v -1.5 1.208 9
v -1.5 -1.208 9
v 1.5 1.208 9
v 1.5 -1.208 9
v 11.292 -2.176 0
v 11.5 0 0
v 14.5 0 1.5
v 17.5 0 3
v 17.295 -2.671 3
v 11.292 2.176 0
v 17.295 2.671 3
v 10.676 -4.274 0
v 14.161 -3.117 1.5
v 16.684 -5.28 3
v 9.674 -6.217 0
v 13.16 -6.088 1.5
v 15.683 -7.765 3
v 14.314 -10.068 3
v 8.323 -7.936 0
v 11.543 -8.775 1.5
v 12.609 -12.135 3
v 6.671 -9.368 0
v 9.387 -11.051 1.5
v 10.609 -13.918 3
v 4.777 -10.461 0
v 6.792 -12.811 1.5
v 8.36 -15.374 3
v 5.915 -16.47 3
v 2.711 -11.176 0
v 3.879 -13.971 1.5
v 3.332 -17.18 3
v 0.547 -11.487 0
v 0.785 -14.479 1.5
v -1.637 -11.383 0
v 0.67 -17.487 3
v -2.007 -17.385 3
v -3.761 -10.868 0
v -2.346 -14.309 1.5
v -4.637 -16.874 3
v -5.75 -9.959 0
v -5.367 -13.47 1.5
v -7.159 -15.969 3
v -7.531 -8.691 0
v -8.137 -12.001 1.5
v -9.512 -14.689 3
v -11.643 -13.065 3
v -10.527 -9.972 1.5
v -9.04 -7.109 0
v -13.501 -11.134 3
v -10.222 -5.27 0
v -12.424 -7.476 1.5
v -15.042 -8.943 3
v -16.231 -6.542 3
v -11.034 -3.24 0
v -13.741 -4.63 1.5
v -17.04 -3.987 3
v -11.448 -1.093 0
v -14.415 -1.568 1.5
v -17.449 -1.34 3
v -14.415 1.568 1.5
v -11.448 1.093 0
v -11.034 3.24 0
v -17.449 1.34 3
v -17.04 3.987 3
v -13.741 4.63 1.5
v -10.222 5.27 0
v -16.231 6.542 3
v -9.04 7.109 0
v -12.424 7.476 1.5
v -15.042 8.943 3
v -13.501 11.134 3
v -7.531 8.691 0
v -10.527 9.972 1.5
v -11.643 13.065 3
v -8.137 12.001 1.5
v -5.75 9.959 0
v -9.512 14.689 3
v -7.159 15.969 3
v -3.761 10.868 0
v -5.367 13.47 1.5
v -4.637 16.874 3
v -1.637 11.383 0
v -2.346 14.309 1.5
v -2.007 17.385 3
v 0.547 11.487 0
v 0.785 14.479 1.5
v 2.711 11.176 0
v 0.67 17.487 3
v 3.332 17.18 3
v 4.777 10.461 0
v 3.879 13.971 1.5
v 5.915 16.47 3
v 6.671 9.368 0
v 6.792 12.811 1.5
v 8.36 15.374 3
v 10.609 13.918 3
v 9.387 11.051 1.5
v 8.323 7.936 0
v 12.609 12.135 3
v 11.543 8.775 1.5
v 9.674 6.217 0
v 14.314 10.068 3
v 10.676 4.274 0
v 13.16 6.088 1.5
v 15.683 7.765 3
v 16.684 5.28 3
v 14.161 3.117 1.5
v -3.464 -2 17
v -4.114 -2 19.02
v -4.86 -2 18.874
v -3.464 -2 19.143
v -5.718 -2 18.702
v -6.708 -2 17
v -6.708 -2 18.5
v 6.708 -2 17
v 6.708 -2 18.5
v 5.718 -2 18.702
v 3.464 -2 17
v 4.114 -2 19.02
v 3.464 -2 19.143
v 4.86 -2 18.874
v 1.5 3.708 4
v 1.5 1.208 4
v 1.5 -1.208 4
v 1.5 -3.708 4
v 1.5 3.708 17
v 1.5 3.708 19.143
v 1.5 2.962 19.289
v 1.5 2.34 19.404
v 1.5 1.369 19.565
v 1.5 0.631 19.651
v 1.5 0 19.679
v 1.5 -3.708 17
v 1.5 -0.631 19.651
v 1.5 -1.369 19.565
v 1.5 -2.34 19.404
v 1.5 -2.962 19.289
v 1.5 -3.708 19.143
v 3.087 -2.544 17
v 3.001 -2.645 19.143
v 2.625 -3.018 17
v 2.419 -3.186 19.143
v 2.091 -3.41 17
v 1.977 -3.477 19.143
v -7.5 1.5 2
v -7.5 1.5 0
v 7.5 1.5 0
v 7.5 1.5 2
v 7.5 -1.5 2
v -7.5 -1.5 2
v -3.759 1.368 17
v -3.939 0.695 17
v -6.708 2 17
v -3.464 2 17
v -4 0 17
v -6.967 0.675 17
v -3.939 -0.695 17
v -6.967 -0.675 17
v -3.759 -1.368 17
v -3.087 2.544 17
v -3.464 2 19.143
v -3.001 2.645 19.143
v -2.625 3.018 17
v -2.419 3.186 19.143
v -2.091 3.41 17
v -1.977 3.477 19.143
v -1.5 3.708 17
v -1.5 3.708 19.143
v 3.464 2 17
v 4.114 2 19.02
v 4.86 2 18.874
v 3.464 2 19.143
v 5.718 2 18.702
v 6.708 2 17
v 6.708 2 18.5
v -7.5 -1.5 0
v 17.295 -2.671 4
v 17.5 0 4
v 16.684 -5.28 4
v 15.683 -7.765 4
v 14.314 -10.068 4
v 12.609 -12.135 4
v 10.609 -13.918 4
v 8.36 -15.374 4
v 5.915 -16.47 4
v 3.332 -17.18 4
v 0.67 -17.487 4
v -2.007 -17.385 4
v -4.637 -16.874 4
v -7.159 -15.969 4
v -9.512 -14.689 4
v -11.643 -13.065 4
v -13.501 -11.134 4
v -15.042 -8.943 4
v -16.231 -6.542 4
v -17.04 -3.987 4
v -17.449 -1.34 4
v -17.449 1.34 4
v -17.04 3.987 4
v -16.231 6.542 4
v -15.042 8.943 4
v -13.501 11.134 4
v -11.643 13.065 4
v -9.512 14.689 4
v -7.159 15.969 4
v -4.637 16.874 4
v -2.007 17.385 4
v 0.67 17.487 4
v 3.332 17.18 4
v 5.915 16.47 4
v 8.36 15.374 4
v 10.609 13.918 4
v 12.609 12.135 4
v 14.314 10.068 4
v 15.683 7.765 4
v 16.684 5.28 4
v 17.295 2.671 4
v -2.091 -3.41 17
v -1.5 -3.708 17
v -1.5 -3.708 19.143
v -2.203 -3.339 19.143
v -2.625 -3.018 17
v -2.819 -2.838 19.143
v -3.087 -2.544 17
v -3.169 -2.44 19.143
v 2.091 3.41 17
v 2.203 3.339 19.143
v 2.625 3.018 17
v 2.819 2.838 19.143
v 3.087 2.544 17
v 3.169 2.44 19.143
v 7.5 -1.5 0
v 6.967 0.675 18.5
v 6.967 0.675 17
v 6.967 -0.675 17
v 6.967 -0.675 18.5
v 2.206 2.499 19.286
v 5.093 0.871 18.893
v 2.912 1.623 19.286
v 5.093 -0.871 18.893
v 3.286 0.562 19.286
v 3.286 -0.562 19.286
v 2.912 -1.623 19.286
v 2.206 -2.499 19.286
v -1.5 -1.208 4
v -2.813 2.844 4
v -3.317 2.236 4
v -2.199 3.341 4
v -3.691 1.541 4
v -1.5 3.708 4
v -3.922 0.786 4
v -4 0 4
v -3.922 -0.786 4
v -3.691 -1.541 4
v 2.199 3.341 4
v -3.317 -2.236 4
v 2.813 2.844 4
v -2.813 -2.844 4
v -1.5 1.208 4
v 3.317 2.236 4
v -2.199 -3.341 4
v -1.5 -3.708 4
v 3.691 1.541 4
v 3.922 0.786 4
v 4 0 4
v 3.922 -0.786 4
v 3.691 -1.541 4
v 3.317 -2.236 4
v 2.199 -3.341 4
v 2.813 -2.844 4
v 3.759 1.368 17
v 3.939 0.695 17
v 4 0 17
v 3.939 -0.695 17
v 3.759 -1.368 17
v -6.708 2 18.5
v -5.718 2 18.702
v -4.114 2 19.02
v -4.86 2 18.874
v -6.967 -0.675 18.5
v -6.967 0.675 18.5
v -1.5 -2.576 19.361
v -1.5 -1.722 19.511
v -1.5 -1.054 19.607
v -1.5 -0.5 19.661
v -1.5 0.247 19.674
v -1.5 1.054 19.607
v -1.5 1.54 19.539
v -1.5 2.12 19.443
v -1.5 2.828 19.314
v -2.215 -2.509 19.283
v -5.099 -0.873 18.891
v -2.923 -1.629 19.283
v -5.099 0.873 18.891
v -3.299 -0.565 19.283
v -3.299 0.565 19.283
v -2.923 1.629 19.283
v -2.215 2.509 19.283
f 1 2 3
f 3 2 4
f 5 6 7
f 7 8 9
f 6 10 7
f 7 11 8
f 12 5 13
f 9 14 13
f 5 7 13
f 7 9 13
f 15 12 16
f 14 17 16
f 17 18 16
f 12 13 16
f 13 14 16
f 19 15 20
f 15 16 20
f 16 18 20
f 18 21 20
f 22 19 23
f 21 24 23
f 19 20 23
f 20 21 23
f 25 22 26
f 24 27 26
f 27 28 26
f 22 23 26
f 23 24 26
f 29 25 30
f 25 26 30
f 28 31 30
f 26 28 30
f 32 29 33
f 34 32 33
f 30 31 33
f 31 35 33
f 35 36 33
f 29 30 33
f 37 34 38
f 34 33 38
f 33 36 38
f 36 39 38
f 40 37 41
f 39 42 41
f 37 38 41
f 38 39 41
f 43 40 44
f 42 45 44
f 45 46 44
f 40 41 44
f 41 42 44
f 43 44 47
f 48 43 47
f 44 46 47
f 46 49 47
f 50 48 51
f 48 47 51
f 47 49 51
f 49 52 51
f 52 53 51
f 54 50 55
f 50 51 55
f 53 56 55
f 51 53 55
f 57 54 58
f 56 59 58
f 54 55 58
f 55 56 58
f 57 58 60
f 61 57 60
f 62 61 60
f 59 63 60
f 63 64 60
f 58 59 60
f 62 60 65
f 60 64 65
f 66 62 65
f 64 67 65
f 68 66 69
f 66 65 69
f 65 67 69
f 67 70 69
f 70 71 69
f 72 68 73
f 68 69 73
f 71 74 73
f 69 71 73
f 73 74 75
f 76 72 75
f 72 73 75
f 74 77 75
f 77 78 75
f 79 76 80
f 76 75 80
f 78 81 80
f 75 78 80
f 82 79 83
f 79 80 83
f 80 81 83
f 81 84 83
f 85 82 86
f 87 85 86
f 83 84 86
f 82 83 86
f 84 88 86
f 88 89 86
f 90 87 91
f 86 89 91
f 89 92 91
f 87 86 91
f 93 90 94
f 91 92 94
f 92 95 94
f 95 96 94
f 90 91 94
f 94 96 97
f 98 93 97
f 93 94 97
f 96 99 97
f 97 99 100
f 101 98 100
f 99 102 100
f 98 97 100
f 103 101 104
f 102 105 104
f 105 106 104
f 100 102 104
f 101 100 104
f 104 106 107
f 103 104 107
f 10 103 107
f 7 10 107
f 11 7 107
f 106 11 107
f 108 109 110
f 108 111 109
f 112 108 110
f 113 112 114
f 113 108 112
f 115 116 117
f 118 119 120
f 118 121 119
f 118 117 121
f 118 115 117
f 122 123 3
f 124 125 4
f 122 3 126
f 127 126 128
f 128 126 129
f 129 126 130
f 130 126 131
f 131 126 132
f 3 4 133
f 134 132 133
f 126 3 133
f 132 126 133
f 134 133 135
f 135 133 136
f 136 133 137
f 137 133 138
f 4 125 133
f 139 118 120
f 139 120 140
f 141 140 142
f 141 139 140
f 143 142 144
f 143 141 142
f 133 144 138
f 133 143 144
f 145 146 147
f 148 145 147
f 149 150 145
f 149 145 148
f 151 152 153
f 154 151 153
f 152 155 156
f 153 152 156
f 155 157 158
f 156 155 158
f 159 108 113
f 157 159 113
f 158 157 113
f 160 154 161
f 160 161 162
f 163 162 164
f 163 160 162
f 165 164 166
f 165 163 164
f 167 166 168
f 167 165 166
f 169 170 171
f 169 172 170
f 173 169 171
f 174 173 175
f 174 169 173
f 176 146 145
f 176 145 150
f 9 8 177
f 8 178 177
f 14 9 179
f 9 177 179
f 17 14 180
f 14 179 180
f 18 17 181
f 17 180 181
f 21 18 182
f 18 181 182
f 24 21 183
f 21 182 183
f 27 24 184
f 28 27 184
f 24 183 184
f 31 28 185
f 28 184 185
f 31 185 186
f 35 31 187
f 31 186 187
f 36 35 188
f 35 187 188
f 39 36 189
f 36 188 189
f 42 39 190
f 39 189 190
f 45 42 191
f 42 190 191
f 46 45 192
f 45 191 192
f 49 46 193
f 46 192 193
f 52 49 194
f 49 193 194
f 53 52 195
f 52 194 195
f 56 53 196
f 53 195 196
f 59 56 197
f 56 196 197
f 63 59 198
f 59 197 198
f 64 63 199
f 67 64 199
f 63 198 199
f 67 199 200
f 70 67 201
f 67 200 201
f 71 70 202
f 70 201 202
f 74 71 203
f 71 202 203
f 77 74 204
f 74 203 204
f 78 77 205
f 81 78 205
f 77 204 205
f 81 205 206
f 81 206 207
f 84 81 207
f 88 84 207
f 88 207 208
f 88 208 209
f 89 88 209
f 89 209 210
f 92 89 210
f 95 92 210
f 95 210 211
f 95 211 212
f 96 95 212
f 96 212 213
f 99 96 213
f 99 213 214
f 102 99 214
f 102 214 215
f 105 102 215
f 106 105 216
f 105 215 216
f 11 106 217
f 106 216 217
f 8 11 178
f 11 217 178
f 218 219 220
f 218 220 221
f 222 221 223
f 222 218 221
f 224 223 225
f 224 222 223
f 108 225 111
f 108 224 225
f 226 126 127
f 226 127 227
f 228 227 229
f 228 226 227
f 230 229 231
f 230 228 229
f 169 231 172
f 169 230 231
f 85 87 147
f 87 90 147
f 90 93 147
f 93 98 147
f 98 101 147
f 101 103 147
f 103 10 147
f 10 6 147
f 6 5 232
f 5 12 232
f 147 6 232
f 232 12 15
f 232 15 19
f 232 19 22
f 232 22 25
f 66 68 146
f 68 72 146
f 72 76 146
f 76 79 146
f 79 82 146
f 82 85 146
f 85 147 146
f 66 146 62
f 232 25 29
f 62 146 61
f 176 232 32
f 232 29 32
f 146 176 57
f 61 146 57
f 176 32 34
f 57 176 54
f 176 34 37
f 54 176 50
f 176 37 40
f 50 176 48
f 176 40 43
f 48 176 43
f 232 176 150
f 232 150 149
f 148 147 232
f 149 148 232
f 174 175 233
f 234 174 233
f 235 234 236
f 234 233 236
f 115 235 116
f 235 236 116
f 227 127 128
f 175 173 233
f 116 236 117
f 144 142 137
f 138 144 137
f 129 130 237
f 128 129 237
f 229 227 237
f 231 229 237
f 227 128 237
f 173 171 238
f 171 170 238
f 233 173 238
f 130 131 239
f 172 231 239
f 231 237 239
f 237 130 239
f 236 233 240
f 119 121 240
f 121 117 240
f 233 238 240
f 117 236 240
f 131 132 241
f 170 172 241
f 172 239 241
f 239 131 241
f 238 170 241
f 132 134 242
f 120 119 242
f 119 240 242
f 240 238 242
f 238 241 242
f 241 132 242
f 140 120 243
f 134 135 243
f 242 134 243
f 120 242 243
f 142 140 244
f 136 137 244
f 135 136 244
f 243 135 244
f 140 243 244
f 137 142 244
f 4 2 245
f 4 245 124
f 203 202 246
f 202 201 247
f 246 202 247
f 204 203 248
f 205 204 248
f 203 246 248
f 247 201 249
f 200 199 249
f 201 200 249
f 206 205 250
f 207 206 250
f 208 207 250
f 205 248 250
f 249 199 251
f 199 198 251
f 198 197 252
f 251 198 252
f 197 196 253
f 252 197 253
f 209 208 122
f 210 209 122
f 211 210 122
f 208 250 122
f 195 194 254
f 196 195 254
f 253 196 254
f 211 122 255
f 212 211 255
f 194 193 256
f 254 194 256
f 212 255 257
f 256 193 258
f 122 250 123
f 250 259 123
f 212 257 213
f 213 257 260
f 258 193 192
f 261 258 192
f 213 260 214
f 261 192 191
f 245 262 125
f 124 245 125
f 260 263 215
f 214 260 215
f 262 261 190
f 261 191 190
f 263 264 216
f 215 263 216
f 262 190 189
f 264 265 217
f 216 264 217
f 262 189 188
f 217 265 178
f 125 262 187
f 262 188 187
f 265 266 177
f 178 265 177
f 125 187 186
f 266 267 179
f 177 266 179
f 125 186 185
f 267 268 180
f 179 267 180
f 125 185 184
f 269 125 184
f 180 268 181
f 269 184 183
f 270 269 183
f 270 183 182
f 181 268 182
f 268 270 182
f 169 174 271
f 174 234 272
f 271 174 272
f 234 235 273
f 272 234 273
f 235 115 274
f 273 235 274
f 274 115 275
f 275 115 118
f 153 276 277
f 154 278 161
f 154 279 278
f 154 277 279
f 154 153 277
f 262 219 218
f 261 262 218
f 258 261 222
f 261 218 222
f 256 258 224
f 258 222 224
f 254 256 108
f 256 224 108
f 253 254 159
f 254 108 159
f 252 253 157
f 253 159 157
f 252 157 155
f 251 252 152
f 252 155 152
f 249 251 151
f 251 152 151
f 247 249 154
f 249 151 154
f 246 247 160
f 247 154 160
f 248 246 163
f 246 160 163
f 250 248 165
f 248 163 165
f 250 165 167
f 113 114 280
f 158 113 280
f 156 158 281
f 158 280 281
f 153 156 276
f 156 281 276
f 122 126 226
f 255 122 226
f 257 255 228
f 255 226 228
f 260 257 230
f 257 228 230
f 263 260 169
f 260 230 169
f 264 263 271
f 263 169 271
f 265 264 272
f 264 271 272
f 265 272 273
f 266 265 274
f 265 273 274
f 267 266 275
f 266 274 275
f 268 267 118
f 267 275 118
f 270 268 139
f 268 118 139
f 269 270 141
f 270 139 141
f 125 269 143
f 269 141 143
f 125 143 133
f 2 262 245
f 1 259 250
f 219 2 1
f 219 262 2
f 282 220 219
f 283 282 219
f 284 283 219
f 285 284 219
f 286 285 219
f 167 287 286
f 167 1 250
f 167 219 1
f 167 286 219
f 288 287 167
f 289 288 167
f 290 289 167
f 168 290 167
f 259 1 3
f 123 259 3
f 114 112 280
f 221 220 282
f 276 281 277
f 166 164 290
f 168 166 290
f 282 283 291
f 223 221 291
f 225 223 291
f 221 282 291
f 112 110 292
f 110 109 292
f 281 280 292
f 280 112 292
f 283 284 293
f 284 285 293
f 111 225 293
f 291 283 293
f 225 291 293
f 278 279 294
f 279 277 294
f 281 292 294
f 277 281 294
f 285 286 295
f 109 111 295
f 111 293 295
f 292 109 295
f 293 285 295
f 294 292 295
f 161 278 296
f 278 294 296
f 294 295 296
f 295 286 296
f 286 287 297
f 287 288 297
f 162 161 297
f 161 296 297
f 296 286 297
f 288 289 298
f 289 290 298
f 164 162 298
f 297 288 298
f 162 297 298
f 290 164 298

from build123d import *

# Parameters (mm, degrees)
F2_W     = 3
F2_H     = 11.5
F3_DEPTH = 25
F5_DEPTH = 15.679571
F6_W     = 15
F6_H     = 3
F7_DEPTH = 2
F8_W     = 3
F8_H     = 3.791901
F9_DEPTH = 5


with BuildPart() as f1:
    # F0 (on Front) → F1 (revolve)
    with BuildSketch(Plane.XZ):
        Polygon((0, 20), (0, 0), (11.5, 0), (17.5, 3), (17.5, 4), (4, 4), (4, 17), (7, 17), (7, 18.5), align=None)
    revolve(axis=Axis((0, 0, 10), (0, 0, -1)))

    # F2 (on Front) → F3 (cut, symmetric)
    with BuildSketch(Plane.XZ):
        with Locations((0, 14.75)):
            Rectangle(F2_W, F2_H)
    extrude(amount=F3_DEPTH, both=True, mode=Mode.SUBTRACT)

    # F4 (on face) → F5 (cut, through all)
    with BuildSketch(Plane.XY.offset(4)):
        with BuildLine():
            ThreePointArc((3.464102, -2), (0, -4), (-3.464102, -2))
            Line((-3.464102, -2), (-11.425484, -2))
            Line((-11.425484, -2), (-11.425484, -9.836984))
            Line((-11.425484, -9.836984), (10.346696, -9.836984))
            Line((10.346696, -9.836984), (10.346696, -2))
            Line((10.346696, -2), (3.464102, -2))
        make_face()
        with BuildLine():
            Line((-11.425484, 9.079754), (-11.425484, 2))
            Line((-11.425484, 2), (-3.464102, 2))
            ThreePointArc((-3.464102, 2), (0, 4), (3.464102, 2))
            Line((3.464102, 2), (10.346696, 2))
            Line((10.346696, 2), (10.346696, 9.079754))
            Line((10.346696, 9.079754), (-11.425484, 9.079754))
        make_face()
    extrude(amount=F5_DEPTH, mode=Mode.SUBTRACT)

    # F6 (on face) → F7 (cut)
    with BuildSketch(Plane(origin=(0, 0, 0), x_dir=(1, 0, 0), z_dir=(0, 0, -1))):
        Rectangle(F6_W, F6_H)
    extrude(amount=-F7_DEPTH, mode=Mode.SUBTRACT)

    # F8 (on face) → F9 (cut, through all)
    with BuildSketch(Plane.XY.offset(9)):
        with Locations((0, 3.104049)):
            Rectangle(F8_W, F8_H)
        with Locations((0, -3.104049)):
            Rectangle(F8_W, F8_H)
    extrude(amount=-F9_DEPTH, mode=Mode.SUBTRACT)


solid = f1.part
